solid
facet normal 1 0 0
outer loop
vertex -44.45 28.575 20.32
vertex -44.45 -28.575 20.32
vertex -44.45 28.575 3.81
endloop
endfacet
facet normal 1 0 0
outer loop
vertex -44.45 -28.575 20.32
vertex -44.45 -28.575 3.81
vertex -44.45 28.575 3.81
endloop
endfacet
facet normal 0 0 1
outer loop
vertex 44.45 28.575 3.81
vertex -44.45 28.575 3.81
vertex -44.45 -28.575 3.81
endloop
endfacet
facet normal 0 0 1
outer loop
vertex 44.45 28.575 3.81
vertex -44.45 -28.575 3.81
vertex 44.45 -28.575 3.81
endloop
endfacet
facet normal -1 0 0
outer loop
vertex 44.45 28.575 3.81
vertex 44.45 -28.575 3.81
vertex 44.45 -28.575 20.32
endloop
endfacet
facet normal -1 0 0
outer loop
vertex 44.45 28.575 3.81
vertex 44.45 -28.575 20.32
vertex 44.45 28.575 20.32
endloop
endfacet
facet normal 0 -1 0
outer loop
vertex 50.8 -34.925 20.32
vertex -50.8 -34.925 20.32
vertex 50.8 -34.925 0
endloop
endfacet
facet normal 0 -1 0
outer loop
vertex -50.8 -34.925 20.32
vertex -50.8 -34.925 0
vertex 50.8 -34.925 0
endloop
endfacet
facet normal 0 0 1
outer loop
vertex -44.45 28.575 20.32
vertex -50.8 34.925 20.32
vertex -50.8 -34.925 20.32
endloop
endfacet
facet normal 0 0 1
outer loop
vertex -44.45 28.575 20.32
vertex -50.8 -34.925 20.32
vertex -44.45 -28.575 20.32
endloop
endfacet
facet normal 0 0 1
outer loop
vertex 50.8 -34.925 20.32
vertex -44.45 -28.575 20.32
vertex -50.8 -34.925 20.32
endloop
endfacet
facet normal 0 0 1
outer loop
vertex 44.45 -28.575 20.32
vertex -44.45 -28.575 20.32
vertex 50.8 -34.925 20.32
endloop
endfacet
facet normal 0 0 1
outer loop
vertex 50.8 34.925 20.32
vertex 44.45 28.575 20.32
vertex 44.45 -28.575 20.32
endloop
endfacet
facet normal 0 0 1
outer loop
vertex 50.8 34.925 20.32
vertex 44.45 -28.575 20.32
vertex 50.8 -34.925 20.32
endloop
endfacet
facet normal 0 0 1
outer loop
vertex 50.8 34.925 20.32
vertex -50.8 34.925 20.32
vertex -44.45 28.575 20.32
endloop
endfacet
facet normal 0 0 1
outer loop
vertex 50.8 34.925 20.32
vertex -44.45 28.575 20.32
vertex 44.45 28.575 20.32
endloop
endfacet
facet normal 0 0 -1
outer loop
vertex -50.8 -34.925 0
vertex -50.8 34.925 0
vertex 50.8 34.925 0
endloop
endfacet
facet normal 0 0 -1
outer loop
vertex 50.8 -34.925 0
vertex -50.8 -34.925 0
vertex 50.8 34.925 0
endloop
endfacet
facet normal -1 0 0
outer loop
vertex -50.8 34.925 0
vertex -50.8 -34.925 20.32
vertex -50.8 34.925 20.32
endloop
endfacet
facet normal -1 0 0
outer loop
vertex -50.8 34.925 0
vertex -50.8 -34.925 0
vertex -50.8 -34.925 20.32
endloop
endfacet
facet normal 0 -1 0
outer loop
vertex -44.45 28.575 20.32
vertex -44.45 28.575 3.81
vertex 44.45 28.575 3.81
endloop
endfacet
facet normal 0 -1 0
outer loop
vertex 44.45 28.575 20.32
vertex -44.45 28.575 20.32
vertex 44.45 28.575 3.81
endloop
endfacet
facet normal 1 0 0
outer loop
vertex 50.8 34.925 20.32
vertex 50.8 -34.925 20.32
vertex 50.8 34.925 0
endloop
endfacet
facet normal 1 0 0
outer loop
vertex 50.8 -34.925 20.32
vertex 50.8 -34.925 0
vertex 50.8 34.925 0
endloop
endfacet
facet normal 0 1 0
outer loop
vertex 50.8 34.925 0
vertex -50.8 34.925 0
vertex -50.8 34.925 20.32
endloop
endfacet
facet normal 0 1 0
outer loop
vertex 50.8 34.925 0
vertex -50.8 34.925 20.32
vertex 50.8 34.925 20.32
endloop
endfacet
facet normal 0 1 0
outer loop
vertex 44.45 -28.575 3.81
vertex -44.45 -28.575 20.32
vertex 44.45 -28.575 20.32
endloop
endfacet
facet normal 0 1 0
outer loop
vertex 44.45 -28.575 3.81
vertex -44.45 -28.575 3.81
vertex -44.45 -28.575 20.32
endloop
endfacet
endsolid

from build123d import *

# Parameters (mm, degrees)
F0_W        = 88.9
F0_H        = 57.15
F1_DEPTH    = 3.81
F2_W        = 6.35
F2_H        = 57.15
F3_DEPTH    = 7.62
F4_W        = 95.25
F4_H        = 6.35
F5_DEPTH    = 7.62
F6_W        = 6.35
F6_H        = 63.5
F7_DEPTH    = 7.62
F8_W        = 101.6
F8_H        = 6.35
F9_DEPTH    = 7.62
F9_FACE_W   = 101.6
F9_FACE_H   = 69.85
F9_FACE_W_2 = 88.9
F9_FACE_H_2 = 57.15
F10_DEPTH   = 12.7


with BuildPart() as f1:
    # F0 (on Top) → F1 (new body)
    with BuildSketch(Plane.XY):
        Rectangle(F0_W, F0_H)
    extrude(amount=F1_DEPTH)

    # F2 (on Top) → F3 (join)
    with BuildSketch(Plane.XY):
        with Locations((-47.625, 0)):
            Rectangle(F2_W, F2_H)
    extrude(amount=F3_DEPTH)

    # F4 (on Top) → F5 (join)
    with BuildSketch(Plane.XY):
        with Locations((-3.175, -31.75)):
            Rectangle(F4_W, F4_H)
    extrude(amount=F5_DEPTH)

    # F6 (on Top) → F7 (join)
    with BuildSketch(Plane.XY):
        with Locations((47.625, -3.175)):
            Rectangle(F6_W, F6_H)
    extrude(amount=F7_DEPTH)

    # F8 (on Top) → F9 (join)
    with BuildSketch(Plane.XY):
        with Locations((0, 31.75)):
            Rectangle(F8_W, F8_H)
    extrude(amount=F9_DEPTH)

    # F9_face (on face) → F10 (join)
    with BuildSketch(Plane.XY.offset(7.62)):
        Rectangle(F9_FACE_W, F9_FACE_H)
        Rectangle(F9_FACE_W_2, F9_FACE_H_2, mode=Mode.SUBTRACT)
    extrude(amount=F10_DEPTH)


solid = f1.part
